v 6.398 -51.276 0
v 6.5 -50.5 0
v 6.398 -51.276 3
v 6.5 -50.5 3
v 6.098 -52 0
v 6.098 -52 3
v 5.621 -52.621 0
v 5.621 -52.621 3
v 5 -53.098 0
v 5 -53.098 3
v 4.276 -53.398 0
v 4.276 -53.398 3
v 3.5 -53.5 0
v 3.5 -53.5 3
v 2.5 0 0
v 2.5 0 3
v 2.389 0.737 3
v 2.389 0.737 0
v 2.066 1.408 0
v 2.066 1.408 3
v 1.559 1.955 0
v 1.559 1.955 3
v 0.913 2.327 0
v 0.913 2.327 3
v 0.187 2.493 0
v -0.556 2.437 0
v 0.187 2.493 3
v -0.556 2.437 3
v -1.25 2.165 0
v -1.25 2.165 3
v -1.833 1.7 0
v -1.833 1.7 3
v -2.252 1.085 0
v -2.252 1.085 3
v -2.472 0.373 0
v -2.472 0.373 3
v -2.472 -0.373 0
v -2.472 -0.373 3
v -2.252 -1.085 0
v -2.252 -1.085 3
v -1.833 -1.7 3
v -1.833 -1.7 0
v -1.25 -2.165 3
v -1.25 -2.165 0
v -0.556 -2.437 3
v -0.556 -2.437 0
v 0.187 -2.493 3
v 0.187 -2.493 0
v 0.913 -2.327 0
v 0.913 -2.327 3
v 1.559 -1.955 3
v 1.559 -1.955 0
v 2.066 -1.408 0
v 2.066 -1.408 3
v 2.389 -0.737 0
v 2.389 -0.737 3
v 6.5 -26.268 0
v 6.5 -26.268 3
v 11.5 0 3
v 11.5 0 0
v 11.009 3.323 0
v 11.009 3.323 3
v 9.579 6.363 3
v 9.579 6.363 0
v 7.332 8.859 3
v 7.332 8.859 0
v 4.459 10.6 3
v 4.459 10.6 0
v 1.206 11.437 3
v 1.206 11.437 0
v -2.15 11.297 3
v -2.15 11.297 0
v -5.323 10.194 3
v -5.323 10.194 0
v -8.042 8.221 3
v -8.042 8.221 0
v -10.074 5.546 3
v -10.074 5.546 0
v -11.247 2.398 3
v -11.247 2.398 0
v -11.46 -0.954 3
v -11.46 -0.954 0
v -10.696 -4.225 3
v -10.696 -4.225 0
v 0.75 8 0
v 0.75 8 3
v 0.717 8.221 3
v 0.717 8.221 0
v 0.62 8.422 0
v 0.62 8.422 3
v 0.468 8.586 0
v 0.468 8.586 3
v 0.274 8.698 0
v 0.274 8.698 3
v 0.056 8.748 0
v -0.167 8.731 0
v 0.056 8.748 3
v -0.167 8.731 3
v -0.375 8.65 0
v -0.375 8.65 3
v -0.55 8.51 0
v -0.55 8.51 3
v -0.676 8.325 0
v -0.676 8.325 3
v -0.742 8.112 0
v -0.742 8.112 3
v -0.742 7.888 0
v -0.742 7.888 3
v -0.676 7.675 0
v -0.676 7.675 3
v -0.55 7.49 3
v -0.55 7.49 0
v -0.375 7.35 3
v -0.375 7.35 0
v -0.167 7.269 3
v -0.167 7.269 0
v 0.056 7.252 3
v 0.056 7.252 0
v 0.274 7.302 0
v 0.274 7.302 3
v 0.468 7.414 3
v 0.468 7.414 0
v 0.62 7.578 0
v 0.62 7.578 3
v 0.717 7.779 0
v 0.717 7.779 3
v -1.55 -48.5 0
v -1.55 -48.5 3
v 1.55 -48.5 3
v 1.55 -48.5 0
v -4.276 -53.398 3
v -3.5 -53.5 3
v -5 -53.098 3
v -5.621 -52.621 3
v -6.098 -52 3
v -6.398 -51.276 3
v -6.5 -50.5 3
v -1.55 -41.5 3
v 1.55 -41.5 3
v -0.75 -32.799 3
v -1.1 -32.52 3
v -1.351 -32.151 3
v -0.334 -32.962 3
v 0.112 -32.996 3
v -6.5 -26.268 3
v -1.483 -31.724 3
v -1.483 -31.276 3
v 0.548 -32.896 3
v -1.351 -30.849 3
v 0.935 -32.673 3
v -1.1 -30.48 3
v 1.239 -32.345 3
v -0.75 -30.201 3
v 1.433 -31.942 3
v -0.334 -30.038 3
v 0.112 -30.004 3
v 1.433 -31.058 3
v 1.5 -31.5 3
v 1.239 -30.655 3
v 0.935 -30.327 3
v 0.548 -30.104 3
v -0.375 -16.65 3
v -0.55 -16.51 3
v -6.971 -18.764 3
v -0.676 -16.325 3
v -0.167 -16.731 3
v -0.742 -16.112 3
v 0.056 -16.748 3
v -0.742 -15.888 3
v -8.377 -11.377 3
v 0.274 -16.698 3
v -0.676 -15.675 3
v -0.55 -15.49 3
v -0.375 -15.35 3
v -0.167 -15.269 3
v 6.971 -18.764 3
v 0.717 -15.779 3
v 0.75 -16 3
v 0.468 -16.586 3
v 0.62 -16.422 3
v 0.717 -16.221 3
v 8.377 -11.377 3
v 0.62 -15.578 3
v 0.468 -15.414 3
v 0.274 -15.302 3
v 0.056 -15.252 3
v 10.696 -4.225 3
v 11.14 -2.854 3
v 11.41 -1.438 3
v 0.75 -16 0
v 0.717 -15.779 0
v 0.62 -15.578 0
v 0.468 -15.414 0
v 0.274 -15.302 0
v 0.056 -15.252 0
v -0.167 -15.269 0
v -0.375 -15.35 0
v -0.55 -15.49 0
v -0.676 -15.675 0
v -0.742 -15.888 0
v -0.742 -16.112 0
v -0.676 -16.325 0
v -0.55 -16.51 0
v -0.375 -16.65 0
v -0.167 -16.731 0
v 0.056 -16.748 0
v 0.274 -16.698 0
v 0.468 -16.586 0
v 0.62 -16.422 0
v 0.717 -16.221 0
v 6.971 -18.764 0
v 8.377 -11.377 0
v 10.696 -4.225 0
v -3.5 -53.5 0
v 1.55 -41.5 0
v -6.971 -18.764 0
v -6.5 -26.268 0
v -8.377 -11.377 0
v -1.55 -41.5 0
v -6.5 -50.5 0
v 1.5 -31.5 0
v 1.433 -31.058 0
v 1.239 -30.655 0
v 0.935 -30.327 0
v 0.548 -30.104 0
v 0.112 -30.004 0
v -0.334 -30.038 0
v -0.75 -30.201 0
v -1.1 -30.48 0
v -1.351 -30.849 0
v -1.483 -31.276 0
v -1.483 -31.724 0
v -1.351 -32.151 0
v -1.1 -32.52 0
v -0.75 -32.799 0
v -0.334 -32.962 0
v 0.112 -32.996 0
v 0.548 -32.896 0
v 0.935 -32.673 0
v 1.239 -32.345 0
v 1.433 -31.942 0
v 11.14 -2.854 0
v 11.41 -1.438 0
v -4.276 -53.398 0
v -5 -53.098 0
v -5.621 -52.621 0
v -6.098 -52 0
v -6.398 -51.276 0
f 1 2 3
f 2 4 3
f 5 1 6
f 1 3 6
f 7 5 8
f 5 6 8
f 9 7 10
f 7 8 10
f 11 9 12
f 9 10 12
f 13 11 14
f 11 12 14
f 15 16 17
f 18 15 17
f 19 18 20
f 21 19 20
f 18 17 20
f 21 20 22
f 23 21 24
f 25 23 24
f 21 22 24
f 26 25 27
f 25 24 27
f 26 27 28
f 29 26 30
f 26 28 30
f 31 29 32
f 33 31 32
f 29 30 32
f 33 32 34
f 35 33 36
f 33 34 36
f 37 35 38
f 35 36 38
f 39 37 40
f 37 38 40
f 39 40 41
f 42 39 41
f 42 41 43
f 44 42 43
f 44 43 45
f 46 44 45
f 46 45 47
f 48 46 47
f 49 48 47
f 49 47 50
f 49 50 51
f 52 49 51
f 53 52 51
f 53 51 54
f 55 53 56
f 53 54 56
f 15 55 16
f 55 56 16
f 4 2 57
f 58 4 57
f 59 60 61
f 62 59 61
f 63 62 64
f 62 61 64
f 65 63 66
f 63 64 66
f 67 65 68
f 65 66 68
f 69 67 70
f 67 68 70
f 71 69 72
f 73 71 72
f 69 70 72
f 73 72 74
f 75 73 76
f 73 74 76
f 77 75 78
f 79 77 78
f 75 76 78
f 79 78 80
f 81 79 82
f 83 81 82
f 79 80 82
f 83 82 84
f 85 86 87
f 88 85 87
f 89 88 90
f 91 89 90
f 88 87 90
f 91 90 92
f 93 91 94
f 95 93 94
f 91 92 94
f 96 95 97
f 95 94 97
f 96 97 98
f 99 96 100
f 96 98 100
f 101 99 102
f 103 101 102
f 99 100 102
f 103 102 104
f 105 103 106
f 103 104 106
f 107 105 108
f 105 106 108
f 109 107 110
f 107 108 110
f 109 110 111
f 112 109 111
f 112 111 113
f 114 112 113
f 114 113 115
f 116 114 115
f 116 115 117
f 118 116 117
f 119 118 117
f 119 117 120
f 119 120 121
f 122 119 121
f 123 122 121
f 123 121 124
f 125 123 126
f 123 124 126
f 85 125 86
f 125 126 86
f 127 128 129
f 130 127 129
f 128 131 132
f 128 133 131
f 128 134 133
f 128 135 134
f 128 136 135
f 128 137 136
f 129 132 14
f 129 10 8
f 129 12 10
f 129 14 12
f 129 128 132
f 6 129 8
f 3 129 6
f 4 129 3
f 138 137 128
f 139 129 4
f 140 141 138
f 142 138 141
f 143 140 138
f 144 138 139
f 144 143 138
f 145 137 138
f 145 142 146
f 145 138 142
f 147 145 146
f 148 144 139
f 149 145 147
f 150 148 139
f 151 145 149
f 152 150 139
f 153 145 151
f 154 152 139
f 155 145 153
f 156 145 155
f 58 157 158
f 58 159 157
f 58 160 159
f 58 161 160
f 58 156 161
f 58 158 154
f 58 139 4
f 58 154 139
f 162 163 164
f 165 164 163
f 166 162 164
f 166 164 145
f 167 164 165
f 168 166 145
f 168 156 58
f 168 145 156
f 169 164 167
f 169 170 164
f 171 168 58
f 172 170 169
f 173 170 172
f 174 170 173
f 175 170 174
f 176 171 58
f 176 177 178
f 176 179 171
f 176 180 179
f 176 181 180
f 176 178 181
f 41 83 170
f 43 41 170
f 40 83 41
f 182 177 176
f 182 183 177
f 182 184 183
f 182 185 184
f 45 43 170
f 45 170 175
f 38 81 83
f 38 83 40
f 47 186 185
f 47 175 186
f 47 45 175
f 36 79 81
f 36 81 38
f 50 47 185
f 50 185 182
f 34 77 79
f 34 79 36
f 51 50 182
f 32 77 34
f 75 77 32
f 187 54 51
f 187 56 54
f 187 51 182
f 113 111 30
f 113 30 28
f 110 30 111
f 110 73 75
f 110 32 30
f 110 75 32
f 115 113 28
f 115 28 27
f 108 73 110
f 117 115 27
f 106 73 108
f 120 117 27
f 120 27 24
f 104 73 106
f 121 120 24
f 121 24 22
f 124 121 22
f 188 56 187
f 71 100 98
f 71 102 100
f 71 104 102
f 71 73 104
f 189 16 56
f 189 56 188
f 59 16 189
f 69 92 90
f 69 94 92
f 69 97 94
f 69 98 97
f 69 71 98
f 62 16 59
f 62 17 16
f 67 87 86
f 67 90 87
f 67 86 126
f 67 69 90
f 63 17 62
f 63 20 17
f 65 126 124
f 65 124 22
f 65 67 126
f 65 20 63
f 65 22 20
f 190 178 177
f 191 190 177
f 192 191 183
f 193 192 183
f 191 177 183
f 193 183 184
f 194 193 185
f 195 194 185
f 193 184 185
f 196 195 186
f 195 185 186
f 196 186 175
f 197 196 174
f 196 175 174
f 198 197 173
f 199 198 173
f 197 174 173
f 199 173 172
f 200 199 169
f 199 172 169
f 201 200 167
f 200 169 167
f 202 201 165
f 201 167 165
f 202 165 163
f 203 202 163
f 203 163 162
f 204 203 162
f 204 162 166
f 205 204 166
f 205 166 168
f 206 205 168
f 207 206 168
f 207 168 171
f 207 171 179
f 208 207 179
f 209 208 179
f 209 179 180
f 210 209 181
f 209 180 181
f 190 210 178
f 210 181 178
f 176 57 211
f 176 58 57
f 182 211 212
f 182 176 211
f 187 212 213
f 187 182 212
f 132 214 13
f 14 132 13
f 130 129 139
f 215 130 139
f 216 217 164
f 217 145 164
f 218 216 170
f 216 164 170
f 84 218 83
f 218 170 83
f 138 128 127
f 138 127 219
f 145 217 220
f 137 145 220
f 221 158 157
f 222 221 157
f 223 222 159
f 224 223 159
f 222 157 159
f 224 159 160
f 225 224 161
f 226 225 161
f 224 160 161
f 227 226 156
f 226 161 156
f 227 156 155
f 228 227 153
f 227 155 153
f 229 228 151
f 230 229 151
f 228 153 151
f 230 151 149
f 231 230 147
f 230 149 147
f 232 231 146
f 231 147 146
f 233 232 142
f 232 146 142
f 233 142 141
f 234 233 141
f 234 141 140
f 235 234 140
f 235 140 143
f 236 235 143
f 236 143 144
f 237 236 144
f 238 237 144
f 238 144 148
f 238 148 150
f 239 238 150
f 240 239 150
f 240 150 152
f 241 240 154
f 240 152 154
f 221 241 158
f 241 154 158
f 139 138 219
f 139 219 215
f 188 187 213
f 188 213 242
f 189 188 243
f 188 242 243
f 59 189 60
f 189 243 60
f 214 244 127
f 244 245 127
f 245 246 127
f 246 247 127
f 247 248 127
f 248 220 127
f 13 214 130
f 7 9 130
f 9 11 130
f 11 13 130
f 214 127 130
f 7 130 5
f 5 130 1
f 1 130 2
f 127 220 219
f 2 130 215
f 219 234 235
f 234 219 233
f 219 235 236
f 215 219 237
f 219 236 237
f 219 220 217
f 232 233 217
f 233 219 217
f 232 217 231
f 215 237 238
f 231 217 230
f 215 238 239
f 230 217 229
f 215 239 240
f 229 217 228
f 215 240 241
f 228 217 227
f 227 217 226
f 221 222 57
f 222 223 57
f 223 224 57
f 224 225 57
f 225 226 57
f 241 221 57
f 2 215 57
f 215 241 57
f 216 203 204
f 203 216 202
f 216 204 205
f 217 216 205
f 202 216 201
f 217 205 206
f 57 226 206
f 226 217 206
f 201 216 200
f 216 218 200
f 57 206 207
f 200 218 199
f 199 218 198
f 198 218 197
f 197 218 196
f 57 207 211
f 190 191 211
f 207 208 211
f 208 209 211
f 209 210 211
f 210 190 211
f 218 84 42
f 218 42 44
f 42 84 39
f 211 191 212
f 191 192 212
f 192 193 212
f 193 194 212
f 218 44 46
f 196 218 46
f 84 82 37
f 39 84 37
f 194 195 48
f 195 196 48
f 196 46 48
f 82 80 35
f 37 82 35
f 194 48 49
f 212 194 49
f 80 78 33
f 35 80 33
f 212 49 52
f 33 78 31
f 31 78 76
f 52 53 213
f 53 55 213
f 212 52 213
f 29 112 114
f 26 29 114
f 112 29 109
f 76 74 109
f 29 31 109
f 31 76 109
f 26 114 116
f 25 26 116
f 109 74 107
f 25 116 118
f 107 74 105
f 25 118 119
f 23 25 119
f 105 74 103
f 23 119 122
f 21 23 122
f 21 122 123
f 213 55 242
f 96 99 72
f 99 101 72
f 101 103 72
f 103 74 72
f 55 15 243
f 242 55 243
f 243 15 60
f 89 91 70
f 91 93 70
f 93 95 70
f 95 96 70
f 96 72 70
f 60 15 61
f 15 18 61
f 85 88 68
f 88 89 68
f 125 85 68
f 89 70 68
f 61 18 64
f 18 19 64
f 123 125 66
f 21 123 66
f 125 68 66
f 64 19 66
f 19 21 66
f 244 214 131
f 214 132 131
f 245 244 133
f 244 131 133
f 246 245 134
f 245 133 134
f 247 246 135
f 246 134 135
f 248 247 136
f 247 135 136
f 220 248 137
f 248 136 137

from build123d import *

# Parameters (mm, degrees)
SALIENTE_EXTRUIR1_DEPTH = 3
CROQUIS2_R              = 2.5
CROQUIS2_R_2            = 1.5
CROQUIS2_W              = 3.1
CROQUIS2_H              = 7
CORTAR_EXTRUIR1_DEPTH   = 3
REDONDEO1_R             = 60
REDONDEO2_R             = 3
CROQUIS3_R              = 0.75
CORTAR_EXTRUIR2_DEPTH   = 3


with BuildPart() as part:
    # Croquis1 → Saliente-Extruir1 (new body)
    with BuildSketch(Plane.XY):
        with BuildLine():
            Line((-6.5, -53.5), (6.5, -53.5))
            Line((6.5, -53.5), (6.5, -9.486832981))
            ThreePointArc((6.5, -9.486832981), (0, -11.5), (-6.5, -9.486832981))
            Line((-6.5, -9.486832981), (-6.5, -53.5))
        make_face()
        with BuildLine():
            ThreePointArc((-6.5, -9.486832981), (0, -11.5), (6.5, -9.486832981))
            Line((6.5, -9.486832981), (6.5, 0))
            Line((6.5, 0), (-6.5, 0))
            Line((-6.5, 0), (-6.5, -9.486832981))
        make_face()
        with BuildLine():
            Line((6.5, 0), (6.5, -9.486832981))
            ThreePointArc((6.5, -9.486832981), (10.173494975, -5.361902647), (11.5, 0))
            ThreePointArc((11.5, 0), (-5.361902647, 10.173494975), (-6.5, -9.486832981))
            Line((-6.5, -9.486832981), (-6.5, 0))
            Line((-6.5, 0), (6.5, 0))
        make_face()
    extrude(amount=SALIENTE_EXTRUIR1_DEPTH)

    # Croquis2 → Cortar-Extruir1 (cut)
    with BuildSketch(Plane.XY.offset(3)):
        Circle(CROQUIS2_R)
        with Locations((0, -31.5)):
            Circle(CROQUIS2_R_2)
        with Locations((0, -45)):
            Rectangle(CROQUIS2_W, CROQUIS2_H)
    extrude(amount=-CORTAR_EXTRUIR1_DEPTH, mode=Mode.SUBTRACT)

    # Redondeo1
    redondeo1_edges = [part.edges().sort_by_distance(p)[0] for p in [
        (-6.5, -9.486832981, 1.5),
        (6.5, -9.486832981, 1.5),
    ]]
    fillet(redondeo1_edges, radius=REDONDEO1_R)

    # Redondeo2
    redondeo2_edges = [part.edges().sort_by_distance(p)[0] for p in [
        (6.5, -53.5, 1.5),
        (-6.5, -53.5, 1.5),
    ]]
    fillet(redondeo2_edges, radius=REDONDEO2_R)

    # Croquis3 → Cortar-Extruir2 (cut)
    with BuildSketch(Plane.XY.offset(3)):
        with Locations((0, 8)):
            Circle(CROQUIS3_R)
        with Locations((0, -16)):
            Circle(CROQUIS3_R)
    extrude(amount=-CORTAR_EXTRUIR2_DEPTH, mode=Mode.SUBTRACT)


solid = part.part
